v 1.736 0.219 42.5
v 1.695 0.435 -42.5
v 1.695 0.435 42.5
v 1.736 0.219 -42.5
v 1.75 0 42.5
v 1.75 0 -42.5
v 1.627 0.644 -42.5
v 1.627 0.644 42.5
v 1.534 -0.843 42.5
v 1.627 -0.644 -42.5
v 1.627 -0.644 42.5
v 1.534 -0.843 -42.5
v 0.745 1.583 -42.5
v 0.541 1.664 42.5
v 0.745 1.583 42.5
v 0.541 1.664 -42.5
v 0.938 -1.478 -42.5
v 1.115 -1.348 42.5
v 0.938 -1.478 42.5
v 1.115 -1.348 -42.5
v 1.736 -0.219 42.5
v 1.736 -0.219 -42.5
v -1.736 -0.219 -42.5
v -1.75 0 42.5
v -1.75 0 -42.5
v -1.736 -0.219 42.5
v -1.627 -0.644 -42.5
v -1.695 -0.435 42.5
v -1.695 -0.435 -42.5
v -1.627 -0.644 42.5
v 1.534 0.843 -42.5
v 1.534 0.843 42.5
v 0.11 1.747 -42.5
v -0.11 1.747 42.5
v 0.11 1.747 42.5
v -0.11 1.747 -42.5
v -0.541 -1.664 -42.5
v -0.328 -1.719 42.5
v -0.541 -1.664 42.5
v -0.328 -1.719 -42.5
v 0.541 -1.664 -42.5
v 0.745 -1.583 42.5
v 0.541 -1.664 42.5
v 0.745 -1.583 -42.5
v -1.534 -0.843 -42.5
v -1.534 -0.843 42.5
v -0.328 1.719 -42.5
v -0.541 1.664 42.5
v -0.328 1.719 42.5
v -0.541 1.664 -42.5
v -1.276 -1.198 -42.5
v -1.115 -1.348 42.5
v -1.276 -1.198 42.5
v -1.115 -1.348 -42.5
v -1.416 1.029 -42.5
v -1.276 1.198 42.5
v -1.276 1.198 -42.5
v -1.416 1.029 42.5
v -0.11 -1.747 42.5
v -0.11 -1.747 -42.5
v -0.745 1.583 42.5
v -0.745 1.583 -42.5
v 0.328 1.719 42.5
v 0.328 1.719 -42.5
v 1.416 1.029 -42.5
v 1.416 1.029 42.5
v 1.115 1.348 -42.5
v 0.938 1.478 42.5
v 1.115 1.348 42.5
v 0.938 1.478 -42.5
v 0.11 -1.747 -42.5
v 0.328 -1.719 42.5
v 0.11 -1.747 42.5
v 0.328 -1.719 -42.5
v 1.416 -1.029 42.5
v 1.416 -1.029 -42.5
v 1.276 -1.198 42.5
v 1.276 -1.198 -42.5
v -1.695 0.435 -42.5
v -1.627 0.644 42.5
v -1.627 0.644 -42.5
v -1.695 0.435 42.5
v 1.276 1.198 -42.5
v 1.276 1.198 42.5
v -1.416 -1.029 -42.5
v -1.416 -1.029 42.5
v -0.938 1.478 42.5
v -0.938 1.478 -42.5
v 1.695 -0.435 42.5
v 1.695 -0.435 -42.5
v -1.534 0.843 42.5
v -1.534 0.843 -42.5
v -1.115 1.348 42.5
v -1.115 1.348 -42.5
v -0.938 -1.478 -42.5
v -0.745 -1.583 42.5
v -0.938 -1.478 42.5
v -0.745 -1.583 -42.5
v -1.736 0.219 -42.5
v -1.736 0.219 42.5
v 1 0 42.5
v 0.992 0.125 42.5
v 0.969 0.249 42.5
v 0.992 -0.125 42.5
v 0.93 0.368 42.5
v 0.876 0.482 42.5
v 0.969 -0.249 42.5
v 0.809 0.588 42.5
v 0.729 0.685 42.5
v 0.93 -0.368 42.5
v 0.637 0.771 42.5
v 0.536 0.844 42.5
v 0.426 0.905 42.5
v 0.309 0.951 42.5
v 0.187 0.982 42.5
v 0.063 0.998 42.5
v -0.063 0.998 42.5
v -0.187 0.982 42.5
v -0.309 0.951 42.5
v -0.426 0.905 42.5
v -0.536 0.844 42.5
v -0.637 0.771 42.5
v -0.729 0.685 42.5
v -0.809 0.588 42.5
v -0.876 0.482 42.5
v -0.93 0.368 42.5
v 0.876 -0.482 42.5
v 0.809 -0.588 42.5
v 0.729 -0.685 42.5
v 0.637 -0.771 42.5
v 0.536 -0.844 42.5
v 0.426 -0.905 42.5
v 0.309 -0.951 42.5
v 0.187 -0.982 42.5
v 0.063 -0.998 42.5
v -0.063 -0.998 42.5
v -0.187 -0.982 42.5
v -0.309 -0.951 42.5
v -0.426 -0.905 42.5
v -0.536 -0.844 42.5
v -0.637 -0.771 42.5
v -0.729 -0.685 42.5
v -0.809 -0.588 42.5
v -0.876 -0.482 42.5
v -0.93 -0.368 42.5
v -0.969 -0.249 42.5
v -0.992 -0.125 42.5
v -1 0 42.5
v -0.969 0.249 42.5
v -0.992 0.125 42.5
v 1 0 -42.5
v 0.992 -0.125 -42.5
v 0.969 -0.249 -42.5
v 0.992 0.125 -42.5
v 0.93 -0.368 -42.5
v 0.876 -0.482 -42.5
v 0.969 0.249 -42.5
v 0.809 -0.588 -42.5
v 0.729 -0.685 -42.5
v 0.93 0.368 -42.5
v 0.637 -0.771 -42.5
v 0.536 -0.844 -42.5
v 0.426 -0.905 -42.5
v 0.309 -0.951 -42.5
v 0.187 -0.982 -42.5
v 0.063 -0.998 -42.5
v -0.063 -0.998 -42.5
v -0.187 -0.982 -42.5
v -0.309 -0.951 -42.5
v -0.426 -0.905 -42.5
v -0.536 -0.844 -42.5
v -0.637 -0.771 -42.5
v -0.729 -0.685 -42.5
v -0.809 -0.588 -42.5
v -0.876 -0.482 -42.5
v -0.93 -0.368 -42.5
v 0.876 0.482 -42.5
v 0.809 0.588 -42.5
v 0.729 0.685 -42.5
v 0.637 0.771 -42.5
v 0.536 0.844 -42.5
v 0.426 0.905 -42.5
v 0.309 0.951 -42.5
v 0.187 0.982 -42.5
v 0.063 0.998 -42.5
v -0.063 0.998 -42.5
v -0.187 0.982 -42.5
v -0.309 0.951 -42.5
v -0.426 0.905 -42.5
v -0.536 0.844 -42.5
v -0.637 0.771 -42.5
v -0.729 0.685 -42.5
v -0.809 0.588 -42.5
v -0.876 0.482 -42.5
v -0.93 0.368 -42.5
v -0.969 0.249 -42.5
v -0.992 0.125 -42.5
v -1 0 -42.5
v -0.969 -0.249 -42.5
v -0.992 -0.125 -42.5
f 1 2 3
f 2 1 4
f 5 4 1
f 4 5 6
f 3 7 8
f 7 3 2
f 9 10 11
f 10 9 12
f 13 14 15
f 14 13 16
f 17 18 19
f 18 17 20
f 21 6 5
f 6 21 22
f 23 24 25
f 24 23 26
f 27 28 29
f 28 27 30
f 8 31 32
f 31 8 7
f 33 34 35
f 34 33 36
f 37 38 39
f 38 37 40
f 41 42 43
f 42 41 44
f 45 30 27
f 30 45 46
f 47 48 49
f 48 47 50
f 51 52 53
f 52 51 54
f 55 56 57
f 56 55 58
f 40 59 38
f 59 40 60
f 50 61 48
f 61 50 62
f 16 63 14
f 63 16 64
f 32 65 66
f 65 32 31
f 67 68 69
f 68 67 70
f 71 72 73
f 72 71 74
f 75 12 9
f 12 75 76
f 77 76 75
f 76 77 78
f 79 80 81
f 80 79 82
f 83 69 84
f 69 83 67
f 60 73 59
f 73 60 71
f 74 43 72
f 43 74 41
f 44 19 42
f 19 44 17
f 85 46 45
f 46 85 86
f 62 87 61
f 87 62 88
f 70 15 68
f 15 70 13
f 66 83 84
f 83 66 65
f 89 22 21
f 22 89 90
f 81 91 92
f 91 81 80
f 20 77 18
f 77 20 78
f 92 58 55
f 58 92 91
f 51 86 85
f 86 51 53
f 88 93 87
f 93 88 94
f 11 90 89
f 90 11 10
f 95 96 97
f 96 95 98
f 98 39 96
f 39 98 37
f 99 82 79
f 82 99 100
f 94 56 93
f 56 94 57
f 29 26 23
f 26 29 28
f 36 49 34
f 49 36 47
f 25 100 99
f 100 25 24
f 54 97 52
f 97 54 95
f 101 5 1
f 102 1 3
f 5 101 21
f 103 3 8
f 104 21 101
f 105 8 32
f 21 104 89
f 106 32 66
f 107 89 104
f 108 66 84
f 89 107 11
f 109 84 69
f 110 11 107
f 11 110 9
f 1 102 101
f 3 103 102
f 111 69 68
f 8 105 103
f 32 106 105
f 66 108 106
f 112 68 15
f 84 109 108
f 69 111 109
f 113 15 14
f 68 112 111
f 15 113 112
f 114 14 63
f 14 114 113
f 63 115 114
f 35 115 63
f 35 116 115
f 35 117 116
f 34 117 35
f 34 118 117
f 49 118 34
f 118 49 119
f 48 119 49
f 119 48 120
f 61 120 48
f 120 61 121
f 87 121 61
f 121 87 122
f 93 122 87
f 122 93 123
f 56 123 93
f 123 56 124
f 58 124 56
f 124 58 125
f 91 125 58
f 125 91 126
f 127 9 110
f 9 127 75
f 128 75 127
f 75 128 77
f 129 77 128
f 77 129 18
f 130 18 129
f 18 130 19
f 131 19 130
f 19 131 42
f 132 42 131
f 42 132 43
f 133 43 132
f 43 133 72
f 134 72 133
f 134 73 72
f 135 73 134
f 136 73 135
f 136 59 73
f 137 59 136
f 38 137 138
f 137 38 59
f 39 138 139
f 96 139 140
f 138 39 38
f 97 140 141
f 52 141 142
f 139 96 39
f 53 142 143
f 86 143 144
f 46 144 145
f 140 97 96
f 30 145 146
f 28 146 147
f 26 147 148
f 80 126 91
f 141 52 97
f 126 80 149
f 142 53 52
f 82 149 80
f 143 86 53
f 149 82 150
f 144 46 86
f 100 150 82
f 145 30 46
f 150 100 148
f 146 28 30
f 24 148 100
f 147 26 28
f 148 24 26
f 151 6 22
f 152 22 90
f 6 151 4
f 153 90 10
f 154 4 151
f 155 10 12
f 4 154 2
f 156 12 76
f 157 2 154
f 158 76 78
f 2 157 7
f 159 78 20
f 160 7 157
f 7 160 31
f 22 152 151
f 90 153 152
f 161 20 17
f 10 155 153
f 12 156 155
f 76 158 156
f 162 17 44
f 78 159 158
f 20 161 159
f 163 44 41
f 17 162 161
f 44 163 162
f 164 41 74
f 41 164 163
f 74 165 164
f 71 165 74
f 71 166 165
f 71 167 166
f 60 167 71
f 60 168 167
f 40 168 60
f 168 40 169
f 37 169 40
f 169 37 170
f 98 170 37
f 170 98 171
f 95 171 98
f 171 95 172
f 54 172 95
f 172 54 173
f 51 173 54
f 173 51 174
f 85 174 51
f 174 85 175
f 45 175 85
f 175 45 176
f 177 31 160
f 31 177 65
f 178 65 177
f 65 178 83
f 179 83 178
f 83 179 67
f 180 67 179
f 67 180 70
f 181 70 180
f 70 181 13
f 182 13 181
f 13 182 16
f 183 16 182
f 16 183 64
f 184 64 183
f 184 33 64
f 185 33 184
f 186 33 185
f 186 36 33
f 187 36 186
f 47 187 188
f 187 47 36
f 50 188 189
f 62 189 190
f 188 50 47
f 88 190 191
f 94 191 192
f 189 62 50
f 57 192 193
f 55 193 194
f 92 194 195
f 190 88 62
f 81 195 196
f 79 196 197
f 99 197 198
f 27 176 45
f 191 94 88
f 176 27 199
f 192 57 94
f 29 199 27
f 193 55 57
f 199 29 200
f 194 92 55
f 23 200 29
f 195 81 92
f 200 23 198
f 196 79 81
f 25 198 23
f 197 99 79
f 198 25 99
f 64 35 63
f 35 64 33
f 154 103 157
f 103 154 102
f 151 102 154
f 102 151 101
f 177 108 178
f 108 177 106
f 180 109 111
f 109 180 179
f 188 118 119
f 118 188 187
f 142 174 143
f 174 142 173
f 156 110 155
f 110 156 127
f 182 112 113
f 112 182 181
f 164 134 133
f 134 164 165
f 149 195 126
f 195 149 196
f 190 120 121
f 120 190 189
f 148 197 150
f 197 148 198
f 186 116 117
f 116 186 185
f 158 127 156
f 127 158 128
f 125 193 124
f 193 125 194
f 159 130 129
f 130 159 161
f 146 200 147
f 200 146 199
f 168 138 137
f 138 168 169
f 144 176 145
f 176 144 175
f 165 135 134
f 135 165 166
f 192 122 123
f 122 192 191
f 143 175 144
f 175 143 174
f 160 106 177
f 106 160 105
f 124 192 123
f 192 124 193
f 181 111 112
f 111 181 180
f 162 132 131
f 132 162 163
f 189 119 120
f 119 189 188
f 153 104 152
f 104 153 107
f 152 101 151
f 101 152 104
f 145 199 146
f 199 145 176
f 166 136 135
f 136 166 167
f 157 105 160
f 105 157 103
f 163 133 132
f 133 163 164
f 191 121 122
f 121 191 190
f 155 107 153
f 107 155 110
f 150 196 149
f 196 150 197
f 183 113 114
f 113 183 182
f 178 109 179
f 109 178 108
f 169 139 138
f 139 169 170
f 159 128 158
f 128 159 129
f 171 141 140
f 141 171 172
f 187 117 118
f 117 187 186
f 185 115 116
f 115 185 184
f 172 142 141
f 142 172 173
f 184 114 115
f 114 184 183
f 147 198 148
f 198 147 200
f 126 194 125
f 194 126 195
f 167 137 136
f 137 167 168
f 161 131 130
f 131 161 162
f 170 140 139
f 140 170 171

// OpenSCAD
$fn = 50;


difference() {
	union() {
		translate(v = [0, 0, -42.5000000000]) {
			cylinder(h = 85, r = 1.7500000000);
		}
	}
	union() {
		translate(v = [0, 0, -100.0000000000]) {
			cylinder(h = 200, r = 1.0000000000);
		}
	}
}
